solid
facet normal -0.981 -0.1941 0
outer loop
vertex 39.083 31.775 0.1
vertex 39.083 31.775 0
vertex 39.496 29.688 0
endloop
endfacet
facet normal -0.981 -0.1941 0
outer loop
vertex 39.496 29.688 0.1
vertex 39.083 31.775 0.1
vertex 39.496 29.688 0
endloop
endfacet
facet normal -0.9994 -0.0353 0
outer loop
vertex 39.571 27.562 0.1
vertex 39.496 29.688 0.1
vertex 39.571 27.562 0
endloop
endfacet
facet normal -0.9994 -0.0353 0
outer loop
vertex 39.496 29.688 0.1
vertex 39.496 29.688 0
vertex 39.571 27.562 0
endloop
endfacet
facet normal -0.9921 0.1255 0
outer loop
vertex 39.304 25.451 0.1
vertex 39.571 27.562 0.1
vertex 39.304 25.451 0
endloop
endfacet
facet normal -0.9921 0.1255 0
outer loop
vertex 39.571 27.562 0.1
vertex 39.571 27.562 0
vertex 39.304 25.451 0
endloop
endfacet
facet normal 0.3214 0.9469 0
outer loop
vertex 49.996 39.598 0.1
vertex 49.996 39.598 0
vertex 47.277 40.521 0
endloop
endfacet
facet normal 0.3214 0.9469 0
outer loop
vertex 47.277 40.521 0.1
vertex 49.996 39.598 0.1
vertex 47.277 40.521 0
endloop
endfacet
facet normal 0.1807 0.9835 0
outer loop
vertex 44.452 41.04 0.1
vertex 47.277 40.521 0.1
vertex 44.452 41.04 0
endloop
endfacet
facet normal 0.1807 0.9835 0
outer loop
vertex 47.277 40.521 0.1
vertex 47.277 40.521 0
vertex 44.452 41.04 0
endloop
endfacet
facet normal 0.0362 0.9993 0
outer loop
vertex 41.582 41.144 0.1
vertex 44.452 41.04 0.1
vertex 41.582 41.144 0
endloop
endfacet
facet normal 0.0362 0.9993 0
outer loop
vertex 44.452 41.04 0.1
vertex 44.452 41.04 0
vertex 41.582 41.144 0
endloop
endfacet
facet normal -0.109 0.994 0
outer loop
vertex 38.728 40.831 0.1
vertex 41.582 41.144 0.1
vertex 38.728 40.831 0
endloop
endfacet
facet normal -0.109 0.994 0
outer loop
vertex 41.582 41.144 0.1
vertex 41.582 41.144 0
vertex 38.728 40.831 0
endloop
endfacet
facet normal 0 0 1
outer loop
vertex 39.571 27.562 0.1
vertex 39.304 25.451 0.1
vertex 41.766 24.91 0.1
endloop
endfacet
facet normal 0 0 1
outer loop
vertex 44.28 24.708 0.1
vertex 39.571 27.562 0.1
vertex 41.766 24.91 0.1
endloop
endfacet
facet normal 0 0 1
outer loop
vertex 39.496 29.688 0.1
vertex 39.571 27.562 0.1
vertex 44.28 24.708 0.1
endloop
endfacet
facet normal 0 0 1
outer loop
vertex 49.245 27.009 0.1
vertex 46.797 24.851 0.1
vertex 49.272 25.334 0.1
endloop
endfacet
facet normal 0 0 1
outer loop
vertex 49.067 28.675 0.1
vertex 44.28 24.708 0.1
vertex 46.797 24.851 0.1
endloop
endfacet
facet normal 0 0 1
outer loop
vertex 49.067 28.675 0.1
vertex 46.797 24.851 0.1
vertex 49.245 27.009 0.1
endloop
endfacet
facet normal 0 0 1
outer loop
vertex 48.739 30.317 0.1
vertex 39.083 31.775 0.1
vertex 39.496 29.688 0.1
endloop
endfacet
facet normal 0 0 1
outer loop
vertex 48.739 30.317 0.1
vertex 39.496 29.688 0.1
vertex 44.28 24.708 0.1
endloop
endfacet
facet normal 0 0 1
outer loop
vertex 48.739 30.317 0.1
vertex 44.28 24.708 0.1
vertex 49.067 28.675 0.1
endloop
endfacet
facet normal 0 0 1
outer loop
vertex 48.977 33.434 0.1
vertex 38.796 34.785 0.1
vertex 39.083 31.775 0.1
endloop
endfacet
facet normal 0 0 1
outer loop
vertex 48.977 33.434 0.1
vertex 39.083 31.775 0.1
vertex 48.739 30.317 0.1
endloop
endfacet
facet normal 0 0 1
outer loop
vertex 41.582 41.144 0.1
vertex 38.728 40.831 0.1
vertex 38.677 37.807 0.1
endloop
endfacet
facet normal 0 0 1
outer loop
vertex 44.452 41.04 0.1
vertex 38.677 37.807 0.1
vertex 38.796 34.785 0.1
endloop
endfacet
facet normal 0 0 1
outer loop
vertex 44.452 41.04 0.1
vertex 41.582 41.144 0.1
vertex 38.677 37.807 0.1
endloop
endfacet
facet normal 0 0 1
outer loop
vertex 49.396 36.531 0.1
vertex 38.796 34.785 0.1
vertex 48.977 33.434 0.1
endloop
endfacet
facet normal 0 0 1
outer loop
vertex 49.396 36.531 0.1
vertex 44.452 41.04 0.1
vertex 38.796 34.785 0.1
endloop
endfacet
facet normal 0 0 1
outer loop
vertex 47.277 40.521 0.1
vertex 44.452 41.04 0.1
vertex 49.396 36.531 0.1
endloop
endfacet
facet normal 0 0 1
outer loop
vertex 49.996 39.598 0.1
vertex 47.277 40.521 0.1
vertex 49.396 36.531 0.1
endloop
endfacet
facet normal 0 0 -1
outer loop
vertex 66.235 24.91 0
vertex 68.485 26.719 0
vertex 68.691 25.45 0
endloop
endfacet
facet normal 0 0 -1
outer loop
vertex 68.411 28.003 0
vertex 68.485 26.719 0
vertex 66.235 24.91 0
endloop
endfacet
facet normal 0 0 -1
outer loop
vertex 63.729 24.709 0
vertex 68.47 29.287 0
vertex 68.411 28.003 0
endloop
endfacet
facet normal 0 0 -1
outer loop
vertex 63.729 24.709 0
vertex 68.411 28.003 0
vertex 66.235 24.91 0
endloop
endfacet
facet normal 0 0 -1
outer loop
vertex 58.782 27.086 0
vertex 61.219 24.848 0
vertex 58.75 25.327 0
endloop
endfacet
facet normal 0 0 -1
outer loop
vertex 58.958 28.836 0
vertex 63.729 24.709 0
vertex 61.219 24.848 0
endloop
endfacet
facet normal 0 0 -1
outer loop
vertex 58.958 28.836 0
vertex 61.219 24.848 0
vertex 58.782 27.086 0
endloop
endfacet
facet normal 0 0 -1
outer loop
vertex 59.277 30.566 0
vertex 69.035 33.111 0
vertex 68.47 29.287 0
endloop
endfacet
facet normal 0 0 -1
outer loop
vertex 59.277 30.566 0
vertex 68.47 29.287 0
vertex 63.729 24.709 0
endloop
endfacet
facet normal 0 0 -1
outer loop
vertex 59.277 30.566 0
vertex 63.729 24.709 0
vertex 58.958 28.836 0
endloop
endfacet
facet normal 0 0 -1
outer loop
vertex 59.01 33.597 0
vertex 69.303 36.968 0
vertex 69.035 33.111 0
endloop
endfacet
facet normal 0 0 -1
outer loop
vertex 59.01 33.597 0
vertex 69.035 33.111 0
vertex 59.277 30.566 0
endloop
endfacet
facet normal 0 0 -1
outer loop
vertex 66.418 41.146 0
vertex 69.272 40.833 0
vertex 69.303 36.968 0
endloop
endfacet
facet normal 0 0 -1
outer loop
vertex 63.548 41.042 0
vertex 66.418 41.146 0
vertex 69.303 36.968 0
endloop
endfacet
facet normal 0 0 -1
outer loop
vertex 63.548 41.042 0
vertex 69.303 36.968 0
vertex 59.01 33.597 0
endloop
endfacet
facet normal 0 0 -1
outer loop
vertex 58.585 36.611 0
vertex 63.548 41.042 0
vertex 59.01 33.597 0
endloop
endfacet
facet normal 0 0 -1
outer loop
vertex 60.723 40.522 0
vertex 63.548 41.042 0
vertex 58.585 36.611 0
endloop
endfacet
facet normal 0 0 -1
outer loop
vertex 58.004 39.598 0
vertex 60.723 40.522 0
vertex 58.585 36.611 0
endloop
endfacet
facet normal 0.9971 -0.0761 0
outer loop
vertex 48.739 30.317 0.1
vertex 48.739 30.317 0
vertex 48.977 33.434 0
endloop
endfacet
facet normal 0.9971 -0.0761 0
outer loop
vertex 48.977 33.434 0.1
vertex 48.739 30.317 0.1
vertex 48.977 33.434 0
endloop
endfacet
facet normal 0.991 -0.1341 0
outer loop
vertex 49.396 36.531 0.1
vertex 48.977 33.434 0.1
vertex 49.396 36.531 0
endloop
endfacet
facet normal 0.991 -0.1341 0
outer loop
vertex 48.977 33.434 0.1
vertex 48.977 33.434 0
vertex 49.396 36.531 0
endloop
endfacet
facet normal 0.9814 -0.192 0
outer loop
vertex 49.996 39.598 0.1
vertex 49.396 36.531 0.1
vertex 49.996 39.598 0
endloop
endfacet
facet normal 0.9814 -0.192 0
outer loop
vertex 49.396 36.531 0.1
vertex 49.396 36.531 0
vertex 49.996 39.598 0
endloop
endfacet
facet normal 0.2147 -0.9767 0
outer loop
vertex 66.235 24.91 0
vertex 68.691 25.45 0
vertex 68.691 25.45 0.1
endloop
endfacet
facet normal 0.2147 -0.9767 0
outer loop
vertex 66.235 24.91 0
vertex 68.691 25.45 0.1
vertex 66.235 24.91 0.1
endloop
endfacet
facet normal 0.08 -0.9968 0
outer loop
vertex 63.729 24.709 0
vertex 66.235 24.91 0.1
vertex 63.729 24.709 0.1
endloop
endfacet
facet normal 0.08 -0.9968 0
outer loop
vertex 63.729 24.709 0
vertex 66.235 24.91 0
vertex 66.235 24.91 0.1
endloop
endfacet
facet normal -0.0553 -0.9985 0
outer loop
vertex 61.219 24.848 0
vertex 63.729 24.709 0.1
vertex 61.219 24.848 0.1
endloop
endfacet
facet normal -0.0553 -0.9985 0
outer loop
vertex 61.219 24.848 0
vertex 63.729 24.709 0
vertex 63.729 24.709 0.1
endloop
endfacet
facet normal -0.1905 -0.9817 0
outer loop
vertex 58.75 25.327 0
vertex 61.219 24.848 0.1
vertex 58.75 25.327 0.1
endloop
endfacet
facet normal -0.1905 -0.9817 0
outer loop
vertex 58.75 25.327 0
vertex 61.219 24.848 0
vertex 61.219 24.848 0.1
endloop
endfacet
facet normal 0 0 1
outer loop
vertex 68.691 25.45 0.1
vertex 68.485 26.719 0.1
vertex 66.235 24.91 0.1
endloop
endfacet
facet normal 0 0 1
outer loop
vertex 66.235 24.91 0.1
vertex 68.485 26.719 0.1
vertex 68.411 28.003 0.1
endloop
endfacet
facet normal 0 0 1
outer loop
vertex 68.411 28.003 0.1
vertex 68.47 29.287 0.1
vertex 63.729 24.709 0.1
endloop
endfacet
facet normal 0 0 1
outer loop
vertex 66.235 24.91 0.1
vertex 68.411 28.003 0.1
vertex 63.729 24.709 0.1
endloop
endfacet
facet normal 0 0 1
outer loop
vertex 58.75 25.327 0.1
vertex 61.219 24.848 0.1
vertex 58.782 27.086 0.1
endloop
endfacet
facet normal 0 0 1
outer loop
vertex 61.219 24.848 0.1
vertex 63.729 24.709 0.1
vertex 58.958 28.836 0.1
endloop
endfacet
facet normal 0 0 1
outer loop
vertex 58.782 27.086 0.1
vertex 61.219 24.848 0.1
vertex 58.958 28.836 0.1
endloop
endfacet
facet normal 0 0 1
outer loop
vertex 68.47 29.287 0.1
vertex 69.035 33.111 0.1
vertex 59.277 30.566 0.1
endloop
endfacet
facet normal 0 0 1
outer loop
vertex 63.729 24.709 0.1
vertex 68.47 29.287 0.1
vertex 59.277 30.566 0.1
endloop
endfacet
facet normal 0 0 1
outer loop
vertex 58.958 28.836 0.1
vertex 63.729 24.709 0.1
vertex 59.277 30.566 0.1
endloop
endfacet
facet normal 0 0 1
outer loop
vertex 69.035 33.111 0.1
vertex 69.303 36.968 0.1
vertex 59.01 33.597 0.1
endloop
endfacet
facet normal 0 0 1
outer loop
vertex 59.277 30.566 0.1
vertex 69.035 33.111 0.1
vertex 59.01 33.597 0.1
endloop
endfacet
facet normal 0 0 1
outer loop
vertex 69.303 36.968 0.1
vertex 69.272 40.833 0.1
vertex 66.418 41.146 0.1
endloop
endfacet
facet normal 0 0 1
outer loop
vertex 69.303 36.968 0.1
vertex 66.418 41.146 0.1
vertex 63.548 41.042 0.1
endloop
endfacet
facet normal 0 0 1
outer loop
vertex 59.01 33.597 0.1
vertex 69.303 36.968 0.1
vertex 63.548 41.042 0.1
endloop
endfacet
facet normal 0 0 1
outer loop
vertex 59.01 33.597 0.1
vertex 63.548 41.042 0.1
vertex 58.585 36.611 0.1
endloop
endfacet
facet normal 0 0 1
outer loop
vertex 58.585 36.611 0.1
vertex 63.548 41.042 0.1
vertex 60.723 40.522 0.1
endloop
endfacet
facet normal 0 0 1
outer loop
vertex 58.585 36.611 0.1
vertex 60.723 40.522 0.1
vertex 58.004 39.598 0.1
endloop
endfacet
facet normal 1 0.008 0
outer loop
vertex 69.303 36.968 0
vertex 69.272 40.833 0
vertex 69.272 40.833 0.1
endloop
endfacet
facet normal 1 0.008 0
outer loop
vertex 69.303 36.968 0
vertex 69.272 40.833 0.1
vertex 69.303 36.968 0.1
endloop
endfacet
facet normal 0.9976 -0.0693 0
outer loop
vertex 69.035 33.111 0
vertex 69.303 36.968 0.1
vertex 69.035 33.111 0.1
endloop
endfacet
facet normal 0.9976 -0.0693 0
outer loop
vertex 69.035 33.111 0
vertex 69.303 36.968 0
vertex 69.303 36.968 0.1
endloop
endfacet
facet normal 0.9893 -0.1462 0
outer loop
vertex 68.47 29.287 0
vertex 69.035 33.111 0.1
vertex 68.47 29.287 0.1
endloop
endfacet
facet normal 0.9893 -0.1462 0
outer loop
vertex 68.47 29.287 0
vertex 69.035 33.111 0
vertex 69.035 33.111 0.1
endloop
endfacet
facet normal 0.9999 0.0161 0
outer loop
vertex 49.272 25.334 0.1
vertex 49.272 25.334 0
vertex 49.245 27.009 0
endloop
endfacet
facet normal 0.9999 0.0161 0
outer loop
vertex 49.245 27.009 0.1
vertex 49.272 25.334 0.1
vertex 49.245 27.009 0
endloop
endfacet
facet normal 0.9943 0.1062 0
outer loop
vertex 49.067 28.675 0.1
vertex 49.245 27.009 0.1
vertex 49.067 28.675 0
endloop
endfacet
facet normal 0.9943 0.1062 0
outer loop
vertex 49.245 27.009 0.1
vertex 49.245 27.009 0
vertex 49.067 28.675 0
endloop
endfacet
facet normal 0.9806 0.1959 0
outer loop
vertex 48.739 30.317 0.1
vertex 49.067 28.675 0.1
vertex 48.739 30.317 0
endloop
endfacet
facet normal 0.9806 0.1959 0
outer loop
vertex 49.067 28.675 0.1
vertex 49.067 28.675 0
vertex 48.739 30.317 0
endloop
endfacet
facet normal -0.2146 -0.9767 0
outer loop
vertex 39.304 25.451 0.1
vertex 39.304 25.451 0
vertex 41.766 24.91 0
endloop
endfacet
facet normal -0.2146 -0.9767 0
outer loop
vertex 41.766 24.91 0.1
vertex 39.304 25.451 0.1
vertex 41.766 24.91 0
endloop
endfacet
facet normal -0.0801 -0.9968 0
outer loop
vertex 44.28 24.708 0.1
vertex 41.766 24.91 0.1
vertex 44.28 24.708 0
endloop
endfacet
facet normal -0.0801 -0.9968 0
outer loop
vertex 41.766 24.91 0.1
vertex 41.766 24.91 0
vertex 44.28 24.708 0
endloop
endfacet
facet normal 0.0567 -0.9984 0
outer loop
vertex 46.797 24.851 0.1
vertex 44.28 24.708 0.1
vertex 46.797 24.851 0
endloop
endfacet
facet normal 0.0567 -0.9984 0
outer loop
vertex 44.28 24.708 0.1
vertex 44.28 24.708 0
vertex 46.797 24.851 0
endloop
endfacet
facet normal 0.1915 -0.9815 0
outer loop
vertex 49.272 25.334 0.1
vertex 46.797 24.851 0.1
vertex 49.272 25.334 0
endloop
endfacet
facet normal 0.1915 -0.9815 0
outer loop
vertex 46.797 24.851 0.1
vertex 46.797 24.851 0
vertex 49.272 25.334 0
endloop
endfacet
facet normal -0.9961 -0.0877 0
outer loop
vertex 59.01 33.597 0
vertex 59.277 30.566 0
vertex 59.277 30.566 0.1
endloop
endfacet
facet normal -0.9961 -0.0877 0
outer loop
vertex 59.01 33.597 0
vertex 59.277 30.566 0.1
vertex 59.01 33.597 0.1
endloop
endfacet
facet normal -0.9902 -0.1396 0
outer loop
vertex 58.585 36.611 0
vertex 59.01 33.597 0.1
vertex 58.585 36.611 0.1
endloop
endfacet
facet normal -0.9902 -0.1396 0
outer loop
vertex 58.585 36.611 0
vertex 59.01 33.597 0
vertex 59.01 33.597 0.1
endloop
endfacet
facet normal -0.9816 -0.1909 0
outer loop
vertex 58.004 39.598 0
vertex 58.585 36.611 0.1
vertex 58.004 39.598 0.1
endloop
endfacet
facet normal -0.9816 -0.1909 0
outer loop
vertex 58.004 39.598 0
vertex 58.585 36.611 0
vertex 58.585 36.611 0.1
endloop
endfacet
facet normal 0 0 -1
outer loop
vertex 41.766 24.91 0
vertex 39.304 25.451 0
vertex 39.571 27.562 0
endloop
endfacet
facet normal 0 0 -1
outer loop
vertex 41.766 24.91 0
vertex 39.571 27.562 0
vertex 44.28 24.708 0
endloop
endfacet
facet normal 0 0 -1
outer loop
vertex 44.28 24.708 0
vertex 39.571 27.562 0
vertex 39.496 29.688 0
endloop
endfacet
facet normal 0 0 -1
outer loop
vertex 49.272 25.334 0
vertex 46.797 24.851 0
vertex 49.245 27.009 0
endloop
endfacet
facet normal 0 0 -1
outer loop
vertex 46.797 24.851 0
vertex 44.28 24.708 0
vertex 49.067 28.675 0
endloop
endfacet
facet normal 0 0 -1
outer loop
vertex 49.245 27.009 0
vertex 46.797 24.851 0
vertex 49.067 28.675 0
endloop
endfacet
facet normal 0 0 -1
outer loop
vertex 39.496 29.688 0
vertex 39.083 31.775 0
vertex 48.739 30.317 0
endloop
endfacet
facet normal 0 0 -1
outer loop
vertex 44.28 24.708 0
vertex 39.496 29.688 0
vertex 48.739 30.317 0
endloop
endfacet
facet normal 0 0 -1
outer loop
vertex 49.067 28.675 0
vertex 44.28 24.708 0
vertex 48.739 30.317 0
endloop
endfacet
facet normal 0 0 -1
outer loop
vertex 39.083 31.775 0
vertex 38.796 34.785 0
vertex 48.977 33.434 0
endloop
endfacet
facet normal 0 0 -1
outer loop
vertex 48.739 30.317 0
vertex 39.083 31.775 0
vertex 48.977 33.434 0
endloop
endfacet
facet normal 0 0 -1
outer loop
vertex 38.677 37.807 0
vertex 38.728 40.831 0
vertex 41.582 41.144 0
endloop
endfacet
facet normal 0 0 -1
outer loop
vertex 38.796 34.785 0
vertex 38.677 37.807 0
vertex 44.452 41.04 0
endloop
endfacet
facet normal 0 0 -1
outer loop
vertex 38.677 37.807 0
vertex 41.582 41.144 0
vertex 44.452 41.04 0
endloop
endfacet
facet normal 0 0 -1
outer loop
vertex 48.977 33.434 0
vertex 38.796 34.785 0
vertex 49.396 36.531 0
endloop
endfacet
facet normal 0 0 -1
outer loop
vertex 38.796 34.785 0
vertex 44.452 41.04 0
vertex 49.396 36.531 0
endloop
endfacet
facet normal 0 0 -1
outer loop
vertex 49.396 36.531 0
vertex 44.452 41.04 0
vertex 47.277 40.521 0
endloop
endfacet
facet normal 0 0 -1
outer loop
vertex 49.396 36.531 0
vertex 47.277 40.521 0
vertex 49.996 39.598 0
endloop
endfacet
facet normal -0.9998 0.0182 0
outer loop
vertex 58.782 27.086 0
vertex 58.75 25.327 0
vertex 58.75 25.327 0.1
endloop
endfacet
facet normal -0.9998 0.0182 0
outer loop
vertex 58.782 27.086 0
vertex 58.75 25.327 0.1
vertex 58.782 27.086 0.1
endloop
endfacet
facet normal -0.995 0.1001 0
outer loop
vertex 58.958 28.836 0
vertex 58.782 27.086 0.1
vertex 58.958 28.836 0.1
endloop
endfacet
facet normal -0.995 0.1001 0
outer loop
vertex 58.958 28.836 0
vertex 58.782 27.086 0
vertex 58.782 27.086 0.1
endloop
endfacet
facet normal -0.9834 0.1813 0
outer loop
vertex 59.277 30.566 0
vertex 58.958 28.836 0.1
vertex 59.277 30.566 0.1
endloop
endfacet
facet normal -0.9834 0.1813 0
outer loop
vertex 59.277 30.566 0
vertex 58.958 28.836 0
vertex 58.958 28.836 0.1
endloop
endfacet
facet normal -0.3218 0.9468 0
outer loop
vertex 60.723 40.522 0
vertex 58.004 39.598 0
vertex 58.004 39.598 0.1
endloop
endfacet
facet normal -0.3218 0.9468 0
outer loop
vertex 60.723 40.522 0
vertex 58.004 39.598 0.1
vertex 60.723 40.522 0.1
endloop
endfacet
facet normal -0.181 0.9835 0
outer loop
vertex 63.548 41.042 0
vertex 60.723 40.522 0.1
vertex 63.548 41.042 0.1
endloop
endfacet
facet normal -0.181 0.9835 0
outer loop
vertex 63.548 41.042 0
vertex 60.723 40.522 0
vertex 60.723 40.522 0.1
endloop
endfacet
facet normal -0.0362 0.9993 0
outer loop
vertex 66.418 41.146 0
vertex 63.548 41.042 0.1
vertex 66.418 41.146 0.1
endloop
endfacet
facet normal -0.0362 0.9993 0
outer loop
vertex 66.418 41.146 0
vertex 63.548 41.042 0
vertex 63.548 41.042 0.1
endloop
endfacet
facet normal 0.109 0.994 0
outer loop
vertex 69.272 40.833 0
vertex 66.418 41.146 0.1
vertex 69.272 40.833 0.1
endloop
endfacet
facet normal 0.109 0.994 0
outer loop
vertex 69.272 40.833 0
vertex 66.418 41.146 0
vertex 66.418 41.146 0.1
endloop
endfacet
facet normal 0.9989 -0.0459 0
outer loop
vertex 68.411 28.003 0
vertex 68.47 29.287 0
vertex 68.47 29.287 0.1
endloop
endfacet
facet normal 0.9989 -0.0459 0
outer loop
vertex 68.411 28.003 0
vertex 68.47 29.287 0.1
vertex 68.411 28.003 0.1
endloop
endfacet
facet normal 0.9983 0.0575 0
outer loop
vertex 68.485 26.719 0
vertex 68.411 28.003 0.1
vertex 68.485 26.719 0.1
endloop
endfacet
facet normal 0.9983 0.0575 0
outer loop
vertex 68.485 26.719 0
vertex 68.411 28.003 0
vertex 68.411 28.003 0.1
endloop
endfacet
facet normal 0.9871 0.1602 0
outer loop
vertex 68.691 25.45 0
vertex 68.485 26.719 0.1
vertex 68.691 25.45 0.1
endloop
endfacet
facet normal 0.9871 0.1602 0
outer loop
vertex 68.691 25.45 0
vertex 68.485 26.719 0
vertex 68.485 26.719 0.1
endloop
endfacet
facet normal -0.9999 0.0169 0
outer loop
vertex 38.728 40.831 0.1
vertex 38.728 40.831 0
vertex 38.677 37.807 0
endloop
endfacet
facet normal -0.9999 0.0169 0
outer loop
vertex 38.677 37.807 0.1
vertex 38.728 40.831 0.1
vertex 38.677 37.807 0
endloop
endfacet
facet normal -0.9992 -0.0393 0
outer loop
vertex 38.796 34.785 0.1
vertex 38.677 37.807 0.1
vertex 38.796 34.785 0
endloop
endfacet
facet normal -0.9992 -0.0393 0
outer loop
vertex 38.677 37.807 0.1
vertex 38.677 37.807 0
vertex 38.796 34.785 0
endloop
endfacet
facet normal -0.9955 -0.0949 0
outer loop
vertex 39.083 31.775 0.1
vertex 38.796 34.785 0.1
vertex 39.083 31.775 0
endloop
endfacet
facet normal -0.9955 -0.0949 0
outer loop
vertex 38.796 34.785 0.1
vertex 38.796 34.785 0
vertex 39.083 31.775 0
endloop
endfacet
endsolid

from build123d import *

# Parameters (mm, degrees)
SALIENTE_EXTRUIR1_DEPTH   = 0.1
SALIENTE_EXTRUIR1_2_DEPTH = 0.1


with BuildPart() as part:
    # Model → Saliente-Extruir1 (new body)
    with BuildSketch(Plane.XY):
        with BuildLine():
            ThreePointArc((38.727641792, 40.830951587), (38.715344206, 36.29551839), (39.082639899, 31.774965394))
            ThreePointArc((39.082639899, 31.774965394), (39.576436382, 28.626551083), (39.303879403, 25.451325054))
            ThreePointArc((39.303879403, 25.451325054), (44.279831034, 24.708477296), (49.271920409, 25.333746117))
            ThreePointArc((49.271920409, 25.333746117), (49.17471595, 27.843656594), (48.738802888, 30.317333838))
            ThreePointArc((48.738802888, 30.317333838), (49.164023548, 34.985180658), (49.996422938, 39.597849929))
            ThreePointArc((49.996422938, 39.597849929), (44.452398712, 41.040219605), (38.727641792, 40.830951587))
        make_face()
    extrude(amount=SALIENTE_EXTRUIR1_DEPTH)


with BuildPart() as body_2:
    # Model → Saliente-Extruir1 2 (new body)
    with BuildSketch(Plane.XY):
        with BuildLine():
            ThreePointArc((59.277255482, 30.565564579), (58.817484117, 35.106939847), (58.003885533, 39.598435853))
            ThreePointArc((58.003885533, 39.598435853), (63.547698616, 41.041616851), (69.272486101, 40.833186622))
            ThreePointArc((69.272486101, 40.833186622), (69.205973765, 35.03683073), (68.469937989, 29.287011876))
            ThreePointArc((68.469937989, 29.287011876), (68.431410818, 27.360007199), (68.690596183, 25.450123875))
            ThreePointArc((68.690596183, 25.450123875), (63.728868303, 24.708599385), (58.750350145, 25.327436261))
            ThreePointArc((58.750350145, 25.327436261), (58.852313973, 27.962744644), (59.277255482, 30.565564579))
        make_face()
    extrude(amount=SALIENTE_EXTRUIR1_2_DEPTH)


solid = Compound([part.part, body_2.part])
